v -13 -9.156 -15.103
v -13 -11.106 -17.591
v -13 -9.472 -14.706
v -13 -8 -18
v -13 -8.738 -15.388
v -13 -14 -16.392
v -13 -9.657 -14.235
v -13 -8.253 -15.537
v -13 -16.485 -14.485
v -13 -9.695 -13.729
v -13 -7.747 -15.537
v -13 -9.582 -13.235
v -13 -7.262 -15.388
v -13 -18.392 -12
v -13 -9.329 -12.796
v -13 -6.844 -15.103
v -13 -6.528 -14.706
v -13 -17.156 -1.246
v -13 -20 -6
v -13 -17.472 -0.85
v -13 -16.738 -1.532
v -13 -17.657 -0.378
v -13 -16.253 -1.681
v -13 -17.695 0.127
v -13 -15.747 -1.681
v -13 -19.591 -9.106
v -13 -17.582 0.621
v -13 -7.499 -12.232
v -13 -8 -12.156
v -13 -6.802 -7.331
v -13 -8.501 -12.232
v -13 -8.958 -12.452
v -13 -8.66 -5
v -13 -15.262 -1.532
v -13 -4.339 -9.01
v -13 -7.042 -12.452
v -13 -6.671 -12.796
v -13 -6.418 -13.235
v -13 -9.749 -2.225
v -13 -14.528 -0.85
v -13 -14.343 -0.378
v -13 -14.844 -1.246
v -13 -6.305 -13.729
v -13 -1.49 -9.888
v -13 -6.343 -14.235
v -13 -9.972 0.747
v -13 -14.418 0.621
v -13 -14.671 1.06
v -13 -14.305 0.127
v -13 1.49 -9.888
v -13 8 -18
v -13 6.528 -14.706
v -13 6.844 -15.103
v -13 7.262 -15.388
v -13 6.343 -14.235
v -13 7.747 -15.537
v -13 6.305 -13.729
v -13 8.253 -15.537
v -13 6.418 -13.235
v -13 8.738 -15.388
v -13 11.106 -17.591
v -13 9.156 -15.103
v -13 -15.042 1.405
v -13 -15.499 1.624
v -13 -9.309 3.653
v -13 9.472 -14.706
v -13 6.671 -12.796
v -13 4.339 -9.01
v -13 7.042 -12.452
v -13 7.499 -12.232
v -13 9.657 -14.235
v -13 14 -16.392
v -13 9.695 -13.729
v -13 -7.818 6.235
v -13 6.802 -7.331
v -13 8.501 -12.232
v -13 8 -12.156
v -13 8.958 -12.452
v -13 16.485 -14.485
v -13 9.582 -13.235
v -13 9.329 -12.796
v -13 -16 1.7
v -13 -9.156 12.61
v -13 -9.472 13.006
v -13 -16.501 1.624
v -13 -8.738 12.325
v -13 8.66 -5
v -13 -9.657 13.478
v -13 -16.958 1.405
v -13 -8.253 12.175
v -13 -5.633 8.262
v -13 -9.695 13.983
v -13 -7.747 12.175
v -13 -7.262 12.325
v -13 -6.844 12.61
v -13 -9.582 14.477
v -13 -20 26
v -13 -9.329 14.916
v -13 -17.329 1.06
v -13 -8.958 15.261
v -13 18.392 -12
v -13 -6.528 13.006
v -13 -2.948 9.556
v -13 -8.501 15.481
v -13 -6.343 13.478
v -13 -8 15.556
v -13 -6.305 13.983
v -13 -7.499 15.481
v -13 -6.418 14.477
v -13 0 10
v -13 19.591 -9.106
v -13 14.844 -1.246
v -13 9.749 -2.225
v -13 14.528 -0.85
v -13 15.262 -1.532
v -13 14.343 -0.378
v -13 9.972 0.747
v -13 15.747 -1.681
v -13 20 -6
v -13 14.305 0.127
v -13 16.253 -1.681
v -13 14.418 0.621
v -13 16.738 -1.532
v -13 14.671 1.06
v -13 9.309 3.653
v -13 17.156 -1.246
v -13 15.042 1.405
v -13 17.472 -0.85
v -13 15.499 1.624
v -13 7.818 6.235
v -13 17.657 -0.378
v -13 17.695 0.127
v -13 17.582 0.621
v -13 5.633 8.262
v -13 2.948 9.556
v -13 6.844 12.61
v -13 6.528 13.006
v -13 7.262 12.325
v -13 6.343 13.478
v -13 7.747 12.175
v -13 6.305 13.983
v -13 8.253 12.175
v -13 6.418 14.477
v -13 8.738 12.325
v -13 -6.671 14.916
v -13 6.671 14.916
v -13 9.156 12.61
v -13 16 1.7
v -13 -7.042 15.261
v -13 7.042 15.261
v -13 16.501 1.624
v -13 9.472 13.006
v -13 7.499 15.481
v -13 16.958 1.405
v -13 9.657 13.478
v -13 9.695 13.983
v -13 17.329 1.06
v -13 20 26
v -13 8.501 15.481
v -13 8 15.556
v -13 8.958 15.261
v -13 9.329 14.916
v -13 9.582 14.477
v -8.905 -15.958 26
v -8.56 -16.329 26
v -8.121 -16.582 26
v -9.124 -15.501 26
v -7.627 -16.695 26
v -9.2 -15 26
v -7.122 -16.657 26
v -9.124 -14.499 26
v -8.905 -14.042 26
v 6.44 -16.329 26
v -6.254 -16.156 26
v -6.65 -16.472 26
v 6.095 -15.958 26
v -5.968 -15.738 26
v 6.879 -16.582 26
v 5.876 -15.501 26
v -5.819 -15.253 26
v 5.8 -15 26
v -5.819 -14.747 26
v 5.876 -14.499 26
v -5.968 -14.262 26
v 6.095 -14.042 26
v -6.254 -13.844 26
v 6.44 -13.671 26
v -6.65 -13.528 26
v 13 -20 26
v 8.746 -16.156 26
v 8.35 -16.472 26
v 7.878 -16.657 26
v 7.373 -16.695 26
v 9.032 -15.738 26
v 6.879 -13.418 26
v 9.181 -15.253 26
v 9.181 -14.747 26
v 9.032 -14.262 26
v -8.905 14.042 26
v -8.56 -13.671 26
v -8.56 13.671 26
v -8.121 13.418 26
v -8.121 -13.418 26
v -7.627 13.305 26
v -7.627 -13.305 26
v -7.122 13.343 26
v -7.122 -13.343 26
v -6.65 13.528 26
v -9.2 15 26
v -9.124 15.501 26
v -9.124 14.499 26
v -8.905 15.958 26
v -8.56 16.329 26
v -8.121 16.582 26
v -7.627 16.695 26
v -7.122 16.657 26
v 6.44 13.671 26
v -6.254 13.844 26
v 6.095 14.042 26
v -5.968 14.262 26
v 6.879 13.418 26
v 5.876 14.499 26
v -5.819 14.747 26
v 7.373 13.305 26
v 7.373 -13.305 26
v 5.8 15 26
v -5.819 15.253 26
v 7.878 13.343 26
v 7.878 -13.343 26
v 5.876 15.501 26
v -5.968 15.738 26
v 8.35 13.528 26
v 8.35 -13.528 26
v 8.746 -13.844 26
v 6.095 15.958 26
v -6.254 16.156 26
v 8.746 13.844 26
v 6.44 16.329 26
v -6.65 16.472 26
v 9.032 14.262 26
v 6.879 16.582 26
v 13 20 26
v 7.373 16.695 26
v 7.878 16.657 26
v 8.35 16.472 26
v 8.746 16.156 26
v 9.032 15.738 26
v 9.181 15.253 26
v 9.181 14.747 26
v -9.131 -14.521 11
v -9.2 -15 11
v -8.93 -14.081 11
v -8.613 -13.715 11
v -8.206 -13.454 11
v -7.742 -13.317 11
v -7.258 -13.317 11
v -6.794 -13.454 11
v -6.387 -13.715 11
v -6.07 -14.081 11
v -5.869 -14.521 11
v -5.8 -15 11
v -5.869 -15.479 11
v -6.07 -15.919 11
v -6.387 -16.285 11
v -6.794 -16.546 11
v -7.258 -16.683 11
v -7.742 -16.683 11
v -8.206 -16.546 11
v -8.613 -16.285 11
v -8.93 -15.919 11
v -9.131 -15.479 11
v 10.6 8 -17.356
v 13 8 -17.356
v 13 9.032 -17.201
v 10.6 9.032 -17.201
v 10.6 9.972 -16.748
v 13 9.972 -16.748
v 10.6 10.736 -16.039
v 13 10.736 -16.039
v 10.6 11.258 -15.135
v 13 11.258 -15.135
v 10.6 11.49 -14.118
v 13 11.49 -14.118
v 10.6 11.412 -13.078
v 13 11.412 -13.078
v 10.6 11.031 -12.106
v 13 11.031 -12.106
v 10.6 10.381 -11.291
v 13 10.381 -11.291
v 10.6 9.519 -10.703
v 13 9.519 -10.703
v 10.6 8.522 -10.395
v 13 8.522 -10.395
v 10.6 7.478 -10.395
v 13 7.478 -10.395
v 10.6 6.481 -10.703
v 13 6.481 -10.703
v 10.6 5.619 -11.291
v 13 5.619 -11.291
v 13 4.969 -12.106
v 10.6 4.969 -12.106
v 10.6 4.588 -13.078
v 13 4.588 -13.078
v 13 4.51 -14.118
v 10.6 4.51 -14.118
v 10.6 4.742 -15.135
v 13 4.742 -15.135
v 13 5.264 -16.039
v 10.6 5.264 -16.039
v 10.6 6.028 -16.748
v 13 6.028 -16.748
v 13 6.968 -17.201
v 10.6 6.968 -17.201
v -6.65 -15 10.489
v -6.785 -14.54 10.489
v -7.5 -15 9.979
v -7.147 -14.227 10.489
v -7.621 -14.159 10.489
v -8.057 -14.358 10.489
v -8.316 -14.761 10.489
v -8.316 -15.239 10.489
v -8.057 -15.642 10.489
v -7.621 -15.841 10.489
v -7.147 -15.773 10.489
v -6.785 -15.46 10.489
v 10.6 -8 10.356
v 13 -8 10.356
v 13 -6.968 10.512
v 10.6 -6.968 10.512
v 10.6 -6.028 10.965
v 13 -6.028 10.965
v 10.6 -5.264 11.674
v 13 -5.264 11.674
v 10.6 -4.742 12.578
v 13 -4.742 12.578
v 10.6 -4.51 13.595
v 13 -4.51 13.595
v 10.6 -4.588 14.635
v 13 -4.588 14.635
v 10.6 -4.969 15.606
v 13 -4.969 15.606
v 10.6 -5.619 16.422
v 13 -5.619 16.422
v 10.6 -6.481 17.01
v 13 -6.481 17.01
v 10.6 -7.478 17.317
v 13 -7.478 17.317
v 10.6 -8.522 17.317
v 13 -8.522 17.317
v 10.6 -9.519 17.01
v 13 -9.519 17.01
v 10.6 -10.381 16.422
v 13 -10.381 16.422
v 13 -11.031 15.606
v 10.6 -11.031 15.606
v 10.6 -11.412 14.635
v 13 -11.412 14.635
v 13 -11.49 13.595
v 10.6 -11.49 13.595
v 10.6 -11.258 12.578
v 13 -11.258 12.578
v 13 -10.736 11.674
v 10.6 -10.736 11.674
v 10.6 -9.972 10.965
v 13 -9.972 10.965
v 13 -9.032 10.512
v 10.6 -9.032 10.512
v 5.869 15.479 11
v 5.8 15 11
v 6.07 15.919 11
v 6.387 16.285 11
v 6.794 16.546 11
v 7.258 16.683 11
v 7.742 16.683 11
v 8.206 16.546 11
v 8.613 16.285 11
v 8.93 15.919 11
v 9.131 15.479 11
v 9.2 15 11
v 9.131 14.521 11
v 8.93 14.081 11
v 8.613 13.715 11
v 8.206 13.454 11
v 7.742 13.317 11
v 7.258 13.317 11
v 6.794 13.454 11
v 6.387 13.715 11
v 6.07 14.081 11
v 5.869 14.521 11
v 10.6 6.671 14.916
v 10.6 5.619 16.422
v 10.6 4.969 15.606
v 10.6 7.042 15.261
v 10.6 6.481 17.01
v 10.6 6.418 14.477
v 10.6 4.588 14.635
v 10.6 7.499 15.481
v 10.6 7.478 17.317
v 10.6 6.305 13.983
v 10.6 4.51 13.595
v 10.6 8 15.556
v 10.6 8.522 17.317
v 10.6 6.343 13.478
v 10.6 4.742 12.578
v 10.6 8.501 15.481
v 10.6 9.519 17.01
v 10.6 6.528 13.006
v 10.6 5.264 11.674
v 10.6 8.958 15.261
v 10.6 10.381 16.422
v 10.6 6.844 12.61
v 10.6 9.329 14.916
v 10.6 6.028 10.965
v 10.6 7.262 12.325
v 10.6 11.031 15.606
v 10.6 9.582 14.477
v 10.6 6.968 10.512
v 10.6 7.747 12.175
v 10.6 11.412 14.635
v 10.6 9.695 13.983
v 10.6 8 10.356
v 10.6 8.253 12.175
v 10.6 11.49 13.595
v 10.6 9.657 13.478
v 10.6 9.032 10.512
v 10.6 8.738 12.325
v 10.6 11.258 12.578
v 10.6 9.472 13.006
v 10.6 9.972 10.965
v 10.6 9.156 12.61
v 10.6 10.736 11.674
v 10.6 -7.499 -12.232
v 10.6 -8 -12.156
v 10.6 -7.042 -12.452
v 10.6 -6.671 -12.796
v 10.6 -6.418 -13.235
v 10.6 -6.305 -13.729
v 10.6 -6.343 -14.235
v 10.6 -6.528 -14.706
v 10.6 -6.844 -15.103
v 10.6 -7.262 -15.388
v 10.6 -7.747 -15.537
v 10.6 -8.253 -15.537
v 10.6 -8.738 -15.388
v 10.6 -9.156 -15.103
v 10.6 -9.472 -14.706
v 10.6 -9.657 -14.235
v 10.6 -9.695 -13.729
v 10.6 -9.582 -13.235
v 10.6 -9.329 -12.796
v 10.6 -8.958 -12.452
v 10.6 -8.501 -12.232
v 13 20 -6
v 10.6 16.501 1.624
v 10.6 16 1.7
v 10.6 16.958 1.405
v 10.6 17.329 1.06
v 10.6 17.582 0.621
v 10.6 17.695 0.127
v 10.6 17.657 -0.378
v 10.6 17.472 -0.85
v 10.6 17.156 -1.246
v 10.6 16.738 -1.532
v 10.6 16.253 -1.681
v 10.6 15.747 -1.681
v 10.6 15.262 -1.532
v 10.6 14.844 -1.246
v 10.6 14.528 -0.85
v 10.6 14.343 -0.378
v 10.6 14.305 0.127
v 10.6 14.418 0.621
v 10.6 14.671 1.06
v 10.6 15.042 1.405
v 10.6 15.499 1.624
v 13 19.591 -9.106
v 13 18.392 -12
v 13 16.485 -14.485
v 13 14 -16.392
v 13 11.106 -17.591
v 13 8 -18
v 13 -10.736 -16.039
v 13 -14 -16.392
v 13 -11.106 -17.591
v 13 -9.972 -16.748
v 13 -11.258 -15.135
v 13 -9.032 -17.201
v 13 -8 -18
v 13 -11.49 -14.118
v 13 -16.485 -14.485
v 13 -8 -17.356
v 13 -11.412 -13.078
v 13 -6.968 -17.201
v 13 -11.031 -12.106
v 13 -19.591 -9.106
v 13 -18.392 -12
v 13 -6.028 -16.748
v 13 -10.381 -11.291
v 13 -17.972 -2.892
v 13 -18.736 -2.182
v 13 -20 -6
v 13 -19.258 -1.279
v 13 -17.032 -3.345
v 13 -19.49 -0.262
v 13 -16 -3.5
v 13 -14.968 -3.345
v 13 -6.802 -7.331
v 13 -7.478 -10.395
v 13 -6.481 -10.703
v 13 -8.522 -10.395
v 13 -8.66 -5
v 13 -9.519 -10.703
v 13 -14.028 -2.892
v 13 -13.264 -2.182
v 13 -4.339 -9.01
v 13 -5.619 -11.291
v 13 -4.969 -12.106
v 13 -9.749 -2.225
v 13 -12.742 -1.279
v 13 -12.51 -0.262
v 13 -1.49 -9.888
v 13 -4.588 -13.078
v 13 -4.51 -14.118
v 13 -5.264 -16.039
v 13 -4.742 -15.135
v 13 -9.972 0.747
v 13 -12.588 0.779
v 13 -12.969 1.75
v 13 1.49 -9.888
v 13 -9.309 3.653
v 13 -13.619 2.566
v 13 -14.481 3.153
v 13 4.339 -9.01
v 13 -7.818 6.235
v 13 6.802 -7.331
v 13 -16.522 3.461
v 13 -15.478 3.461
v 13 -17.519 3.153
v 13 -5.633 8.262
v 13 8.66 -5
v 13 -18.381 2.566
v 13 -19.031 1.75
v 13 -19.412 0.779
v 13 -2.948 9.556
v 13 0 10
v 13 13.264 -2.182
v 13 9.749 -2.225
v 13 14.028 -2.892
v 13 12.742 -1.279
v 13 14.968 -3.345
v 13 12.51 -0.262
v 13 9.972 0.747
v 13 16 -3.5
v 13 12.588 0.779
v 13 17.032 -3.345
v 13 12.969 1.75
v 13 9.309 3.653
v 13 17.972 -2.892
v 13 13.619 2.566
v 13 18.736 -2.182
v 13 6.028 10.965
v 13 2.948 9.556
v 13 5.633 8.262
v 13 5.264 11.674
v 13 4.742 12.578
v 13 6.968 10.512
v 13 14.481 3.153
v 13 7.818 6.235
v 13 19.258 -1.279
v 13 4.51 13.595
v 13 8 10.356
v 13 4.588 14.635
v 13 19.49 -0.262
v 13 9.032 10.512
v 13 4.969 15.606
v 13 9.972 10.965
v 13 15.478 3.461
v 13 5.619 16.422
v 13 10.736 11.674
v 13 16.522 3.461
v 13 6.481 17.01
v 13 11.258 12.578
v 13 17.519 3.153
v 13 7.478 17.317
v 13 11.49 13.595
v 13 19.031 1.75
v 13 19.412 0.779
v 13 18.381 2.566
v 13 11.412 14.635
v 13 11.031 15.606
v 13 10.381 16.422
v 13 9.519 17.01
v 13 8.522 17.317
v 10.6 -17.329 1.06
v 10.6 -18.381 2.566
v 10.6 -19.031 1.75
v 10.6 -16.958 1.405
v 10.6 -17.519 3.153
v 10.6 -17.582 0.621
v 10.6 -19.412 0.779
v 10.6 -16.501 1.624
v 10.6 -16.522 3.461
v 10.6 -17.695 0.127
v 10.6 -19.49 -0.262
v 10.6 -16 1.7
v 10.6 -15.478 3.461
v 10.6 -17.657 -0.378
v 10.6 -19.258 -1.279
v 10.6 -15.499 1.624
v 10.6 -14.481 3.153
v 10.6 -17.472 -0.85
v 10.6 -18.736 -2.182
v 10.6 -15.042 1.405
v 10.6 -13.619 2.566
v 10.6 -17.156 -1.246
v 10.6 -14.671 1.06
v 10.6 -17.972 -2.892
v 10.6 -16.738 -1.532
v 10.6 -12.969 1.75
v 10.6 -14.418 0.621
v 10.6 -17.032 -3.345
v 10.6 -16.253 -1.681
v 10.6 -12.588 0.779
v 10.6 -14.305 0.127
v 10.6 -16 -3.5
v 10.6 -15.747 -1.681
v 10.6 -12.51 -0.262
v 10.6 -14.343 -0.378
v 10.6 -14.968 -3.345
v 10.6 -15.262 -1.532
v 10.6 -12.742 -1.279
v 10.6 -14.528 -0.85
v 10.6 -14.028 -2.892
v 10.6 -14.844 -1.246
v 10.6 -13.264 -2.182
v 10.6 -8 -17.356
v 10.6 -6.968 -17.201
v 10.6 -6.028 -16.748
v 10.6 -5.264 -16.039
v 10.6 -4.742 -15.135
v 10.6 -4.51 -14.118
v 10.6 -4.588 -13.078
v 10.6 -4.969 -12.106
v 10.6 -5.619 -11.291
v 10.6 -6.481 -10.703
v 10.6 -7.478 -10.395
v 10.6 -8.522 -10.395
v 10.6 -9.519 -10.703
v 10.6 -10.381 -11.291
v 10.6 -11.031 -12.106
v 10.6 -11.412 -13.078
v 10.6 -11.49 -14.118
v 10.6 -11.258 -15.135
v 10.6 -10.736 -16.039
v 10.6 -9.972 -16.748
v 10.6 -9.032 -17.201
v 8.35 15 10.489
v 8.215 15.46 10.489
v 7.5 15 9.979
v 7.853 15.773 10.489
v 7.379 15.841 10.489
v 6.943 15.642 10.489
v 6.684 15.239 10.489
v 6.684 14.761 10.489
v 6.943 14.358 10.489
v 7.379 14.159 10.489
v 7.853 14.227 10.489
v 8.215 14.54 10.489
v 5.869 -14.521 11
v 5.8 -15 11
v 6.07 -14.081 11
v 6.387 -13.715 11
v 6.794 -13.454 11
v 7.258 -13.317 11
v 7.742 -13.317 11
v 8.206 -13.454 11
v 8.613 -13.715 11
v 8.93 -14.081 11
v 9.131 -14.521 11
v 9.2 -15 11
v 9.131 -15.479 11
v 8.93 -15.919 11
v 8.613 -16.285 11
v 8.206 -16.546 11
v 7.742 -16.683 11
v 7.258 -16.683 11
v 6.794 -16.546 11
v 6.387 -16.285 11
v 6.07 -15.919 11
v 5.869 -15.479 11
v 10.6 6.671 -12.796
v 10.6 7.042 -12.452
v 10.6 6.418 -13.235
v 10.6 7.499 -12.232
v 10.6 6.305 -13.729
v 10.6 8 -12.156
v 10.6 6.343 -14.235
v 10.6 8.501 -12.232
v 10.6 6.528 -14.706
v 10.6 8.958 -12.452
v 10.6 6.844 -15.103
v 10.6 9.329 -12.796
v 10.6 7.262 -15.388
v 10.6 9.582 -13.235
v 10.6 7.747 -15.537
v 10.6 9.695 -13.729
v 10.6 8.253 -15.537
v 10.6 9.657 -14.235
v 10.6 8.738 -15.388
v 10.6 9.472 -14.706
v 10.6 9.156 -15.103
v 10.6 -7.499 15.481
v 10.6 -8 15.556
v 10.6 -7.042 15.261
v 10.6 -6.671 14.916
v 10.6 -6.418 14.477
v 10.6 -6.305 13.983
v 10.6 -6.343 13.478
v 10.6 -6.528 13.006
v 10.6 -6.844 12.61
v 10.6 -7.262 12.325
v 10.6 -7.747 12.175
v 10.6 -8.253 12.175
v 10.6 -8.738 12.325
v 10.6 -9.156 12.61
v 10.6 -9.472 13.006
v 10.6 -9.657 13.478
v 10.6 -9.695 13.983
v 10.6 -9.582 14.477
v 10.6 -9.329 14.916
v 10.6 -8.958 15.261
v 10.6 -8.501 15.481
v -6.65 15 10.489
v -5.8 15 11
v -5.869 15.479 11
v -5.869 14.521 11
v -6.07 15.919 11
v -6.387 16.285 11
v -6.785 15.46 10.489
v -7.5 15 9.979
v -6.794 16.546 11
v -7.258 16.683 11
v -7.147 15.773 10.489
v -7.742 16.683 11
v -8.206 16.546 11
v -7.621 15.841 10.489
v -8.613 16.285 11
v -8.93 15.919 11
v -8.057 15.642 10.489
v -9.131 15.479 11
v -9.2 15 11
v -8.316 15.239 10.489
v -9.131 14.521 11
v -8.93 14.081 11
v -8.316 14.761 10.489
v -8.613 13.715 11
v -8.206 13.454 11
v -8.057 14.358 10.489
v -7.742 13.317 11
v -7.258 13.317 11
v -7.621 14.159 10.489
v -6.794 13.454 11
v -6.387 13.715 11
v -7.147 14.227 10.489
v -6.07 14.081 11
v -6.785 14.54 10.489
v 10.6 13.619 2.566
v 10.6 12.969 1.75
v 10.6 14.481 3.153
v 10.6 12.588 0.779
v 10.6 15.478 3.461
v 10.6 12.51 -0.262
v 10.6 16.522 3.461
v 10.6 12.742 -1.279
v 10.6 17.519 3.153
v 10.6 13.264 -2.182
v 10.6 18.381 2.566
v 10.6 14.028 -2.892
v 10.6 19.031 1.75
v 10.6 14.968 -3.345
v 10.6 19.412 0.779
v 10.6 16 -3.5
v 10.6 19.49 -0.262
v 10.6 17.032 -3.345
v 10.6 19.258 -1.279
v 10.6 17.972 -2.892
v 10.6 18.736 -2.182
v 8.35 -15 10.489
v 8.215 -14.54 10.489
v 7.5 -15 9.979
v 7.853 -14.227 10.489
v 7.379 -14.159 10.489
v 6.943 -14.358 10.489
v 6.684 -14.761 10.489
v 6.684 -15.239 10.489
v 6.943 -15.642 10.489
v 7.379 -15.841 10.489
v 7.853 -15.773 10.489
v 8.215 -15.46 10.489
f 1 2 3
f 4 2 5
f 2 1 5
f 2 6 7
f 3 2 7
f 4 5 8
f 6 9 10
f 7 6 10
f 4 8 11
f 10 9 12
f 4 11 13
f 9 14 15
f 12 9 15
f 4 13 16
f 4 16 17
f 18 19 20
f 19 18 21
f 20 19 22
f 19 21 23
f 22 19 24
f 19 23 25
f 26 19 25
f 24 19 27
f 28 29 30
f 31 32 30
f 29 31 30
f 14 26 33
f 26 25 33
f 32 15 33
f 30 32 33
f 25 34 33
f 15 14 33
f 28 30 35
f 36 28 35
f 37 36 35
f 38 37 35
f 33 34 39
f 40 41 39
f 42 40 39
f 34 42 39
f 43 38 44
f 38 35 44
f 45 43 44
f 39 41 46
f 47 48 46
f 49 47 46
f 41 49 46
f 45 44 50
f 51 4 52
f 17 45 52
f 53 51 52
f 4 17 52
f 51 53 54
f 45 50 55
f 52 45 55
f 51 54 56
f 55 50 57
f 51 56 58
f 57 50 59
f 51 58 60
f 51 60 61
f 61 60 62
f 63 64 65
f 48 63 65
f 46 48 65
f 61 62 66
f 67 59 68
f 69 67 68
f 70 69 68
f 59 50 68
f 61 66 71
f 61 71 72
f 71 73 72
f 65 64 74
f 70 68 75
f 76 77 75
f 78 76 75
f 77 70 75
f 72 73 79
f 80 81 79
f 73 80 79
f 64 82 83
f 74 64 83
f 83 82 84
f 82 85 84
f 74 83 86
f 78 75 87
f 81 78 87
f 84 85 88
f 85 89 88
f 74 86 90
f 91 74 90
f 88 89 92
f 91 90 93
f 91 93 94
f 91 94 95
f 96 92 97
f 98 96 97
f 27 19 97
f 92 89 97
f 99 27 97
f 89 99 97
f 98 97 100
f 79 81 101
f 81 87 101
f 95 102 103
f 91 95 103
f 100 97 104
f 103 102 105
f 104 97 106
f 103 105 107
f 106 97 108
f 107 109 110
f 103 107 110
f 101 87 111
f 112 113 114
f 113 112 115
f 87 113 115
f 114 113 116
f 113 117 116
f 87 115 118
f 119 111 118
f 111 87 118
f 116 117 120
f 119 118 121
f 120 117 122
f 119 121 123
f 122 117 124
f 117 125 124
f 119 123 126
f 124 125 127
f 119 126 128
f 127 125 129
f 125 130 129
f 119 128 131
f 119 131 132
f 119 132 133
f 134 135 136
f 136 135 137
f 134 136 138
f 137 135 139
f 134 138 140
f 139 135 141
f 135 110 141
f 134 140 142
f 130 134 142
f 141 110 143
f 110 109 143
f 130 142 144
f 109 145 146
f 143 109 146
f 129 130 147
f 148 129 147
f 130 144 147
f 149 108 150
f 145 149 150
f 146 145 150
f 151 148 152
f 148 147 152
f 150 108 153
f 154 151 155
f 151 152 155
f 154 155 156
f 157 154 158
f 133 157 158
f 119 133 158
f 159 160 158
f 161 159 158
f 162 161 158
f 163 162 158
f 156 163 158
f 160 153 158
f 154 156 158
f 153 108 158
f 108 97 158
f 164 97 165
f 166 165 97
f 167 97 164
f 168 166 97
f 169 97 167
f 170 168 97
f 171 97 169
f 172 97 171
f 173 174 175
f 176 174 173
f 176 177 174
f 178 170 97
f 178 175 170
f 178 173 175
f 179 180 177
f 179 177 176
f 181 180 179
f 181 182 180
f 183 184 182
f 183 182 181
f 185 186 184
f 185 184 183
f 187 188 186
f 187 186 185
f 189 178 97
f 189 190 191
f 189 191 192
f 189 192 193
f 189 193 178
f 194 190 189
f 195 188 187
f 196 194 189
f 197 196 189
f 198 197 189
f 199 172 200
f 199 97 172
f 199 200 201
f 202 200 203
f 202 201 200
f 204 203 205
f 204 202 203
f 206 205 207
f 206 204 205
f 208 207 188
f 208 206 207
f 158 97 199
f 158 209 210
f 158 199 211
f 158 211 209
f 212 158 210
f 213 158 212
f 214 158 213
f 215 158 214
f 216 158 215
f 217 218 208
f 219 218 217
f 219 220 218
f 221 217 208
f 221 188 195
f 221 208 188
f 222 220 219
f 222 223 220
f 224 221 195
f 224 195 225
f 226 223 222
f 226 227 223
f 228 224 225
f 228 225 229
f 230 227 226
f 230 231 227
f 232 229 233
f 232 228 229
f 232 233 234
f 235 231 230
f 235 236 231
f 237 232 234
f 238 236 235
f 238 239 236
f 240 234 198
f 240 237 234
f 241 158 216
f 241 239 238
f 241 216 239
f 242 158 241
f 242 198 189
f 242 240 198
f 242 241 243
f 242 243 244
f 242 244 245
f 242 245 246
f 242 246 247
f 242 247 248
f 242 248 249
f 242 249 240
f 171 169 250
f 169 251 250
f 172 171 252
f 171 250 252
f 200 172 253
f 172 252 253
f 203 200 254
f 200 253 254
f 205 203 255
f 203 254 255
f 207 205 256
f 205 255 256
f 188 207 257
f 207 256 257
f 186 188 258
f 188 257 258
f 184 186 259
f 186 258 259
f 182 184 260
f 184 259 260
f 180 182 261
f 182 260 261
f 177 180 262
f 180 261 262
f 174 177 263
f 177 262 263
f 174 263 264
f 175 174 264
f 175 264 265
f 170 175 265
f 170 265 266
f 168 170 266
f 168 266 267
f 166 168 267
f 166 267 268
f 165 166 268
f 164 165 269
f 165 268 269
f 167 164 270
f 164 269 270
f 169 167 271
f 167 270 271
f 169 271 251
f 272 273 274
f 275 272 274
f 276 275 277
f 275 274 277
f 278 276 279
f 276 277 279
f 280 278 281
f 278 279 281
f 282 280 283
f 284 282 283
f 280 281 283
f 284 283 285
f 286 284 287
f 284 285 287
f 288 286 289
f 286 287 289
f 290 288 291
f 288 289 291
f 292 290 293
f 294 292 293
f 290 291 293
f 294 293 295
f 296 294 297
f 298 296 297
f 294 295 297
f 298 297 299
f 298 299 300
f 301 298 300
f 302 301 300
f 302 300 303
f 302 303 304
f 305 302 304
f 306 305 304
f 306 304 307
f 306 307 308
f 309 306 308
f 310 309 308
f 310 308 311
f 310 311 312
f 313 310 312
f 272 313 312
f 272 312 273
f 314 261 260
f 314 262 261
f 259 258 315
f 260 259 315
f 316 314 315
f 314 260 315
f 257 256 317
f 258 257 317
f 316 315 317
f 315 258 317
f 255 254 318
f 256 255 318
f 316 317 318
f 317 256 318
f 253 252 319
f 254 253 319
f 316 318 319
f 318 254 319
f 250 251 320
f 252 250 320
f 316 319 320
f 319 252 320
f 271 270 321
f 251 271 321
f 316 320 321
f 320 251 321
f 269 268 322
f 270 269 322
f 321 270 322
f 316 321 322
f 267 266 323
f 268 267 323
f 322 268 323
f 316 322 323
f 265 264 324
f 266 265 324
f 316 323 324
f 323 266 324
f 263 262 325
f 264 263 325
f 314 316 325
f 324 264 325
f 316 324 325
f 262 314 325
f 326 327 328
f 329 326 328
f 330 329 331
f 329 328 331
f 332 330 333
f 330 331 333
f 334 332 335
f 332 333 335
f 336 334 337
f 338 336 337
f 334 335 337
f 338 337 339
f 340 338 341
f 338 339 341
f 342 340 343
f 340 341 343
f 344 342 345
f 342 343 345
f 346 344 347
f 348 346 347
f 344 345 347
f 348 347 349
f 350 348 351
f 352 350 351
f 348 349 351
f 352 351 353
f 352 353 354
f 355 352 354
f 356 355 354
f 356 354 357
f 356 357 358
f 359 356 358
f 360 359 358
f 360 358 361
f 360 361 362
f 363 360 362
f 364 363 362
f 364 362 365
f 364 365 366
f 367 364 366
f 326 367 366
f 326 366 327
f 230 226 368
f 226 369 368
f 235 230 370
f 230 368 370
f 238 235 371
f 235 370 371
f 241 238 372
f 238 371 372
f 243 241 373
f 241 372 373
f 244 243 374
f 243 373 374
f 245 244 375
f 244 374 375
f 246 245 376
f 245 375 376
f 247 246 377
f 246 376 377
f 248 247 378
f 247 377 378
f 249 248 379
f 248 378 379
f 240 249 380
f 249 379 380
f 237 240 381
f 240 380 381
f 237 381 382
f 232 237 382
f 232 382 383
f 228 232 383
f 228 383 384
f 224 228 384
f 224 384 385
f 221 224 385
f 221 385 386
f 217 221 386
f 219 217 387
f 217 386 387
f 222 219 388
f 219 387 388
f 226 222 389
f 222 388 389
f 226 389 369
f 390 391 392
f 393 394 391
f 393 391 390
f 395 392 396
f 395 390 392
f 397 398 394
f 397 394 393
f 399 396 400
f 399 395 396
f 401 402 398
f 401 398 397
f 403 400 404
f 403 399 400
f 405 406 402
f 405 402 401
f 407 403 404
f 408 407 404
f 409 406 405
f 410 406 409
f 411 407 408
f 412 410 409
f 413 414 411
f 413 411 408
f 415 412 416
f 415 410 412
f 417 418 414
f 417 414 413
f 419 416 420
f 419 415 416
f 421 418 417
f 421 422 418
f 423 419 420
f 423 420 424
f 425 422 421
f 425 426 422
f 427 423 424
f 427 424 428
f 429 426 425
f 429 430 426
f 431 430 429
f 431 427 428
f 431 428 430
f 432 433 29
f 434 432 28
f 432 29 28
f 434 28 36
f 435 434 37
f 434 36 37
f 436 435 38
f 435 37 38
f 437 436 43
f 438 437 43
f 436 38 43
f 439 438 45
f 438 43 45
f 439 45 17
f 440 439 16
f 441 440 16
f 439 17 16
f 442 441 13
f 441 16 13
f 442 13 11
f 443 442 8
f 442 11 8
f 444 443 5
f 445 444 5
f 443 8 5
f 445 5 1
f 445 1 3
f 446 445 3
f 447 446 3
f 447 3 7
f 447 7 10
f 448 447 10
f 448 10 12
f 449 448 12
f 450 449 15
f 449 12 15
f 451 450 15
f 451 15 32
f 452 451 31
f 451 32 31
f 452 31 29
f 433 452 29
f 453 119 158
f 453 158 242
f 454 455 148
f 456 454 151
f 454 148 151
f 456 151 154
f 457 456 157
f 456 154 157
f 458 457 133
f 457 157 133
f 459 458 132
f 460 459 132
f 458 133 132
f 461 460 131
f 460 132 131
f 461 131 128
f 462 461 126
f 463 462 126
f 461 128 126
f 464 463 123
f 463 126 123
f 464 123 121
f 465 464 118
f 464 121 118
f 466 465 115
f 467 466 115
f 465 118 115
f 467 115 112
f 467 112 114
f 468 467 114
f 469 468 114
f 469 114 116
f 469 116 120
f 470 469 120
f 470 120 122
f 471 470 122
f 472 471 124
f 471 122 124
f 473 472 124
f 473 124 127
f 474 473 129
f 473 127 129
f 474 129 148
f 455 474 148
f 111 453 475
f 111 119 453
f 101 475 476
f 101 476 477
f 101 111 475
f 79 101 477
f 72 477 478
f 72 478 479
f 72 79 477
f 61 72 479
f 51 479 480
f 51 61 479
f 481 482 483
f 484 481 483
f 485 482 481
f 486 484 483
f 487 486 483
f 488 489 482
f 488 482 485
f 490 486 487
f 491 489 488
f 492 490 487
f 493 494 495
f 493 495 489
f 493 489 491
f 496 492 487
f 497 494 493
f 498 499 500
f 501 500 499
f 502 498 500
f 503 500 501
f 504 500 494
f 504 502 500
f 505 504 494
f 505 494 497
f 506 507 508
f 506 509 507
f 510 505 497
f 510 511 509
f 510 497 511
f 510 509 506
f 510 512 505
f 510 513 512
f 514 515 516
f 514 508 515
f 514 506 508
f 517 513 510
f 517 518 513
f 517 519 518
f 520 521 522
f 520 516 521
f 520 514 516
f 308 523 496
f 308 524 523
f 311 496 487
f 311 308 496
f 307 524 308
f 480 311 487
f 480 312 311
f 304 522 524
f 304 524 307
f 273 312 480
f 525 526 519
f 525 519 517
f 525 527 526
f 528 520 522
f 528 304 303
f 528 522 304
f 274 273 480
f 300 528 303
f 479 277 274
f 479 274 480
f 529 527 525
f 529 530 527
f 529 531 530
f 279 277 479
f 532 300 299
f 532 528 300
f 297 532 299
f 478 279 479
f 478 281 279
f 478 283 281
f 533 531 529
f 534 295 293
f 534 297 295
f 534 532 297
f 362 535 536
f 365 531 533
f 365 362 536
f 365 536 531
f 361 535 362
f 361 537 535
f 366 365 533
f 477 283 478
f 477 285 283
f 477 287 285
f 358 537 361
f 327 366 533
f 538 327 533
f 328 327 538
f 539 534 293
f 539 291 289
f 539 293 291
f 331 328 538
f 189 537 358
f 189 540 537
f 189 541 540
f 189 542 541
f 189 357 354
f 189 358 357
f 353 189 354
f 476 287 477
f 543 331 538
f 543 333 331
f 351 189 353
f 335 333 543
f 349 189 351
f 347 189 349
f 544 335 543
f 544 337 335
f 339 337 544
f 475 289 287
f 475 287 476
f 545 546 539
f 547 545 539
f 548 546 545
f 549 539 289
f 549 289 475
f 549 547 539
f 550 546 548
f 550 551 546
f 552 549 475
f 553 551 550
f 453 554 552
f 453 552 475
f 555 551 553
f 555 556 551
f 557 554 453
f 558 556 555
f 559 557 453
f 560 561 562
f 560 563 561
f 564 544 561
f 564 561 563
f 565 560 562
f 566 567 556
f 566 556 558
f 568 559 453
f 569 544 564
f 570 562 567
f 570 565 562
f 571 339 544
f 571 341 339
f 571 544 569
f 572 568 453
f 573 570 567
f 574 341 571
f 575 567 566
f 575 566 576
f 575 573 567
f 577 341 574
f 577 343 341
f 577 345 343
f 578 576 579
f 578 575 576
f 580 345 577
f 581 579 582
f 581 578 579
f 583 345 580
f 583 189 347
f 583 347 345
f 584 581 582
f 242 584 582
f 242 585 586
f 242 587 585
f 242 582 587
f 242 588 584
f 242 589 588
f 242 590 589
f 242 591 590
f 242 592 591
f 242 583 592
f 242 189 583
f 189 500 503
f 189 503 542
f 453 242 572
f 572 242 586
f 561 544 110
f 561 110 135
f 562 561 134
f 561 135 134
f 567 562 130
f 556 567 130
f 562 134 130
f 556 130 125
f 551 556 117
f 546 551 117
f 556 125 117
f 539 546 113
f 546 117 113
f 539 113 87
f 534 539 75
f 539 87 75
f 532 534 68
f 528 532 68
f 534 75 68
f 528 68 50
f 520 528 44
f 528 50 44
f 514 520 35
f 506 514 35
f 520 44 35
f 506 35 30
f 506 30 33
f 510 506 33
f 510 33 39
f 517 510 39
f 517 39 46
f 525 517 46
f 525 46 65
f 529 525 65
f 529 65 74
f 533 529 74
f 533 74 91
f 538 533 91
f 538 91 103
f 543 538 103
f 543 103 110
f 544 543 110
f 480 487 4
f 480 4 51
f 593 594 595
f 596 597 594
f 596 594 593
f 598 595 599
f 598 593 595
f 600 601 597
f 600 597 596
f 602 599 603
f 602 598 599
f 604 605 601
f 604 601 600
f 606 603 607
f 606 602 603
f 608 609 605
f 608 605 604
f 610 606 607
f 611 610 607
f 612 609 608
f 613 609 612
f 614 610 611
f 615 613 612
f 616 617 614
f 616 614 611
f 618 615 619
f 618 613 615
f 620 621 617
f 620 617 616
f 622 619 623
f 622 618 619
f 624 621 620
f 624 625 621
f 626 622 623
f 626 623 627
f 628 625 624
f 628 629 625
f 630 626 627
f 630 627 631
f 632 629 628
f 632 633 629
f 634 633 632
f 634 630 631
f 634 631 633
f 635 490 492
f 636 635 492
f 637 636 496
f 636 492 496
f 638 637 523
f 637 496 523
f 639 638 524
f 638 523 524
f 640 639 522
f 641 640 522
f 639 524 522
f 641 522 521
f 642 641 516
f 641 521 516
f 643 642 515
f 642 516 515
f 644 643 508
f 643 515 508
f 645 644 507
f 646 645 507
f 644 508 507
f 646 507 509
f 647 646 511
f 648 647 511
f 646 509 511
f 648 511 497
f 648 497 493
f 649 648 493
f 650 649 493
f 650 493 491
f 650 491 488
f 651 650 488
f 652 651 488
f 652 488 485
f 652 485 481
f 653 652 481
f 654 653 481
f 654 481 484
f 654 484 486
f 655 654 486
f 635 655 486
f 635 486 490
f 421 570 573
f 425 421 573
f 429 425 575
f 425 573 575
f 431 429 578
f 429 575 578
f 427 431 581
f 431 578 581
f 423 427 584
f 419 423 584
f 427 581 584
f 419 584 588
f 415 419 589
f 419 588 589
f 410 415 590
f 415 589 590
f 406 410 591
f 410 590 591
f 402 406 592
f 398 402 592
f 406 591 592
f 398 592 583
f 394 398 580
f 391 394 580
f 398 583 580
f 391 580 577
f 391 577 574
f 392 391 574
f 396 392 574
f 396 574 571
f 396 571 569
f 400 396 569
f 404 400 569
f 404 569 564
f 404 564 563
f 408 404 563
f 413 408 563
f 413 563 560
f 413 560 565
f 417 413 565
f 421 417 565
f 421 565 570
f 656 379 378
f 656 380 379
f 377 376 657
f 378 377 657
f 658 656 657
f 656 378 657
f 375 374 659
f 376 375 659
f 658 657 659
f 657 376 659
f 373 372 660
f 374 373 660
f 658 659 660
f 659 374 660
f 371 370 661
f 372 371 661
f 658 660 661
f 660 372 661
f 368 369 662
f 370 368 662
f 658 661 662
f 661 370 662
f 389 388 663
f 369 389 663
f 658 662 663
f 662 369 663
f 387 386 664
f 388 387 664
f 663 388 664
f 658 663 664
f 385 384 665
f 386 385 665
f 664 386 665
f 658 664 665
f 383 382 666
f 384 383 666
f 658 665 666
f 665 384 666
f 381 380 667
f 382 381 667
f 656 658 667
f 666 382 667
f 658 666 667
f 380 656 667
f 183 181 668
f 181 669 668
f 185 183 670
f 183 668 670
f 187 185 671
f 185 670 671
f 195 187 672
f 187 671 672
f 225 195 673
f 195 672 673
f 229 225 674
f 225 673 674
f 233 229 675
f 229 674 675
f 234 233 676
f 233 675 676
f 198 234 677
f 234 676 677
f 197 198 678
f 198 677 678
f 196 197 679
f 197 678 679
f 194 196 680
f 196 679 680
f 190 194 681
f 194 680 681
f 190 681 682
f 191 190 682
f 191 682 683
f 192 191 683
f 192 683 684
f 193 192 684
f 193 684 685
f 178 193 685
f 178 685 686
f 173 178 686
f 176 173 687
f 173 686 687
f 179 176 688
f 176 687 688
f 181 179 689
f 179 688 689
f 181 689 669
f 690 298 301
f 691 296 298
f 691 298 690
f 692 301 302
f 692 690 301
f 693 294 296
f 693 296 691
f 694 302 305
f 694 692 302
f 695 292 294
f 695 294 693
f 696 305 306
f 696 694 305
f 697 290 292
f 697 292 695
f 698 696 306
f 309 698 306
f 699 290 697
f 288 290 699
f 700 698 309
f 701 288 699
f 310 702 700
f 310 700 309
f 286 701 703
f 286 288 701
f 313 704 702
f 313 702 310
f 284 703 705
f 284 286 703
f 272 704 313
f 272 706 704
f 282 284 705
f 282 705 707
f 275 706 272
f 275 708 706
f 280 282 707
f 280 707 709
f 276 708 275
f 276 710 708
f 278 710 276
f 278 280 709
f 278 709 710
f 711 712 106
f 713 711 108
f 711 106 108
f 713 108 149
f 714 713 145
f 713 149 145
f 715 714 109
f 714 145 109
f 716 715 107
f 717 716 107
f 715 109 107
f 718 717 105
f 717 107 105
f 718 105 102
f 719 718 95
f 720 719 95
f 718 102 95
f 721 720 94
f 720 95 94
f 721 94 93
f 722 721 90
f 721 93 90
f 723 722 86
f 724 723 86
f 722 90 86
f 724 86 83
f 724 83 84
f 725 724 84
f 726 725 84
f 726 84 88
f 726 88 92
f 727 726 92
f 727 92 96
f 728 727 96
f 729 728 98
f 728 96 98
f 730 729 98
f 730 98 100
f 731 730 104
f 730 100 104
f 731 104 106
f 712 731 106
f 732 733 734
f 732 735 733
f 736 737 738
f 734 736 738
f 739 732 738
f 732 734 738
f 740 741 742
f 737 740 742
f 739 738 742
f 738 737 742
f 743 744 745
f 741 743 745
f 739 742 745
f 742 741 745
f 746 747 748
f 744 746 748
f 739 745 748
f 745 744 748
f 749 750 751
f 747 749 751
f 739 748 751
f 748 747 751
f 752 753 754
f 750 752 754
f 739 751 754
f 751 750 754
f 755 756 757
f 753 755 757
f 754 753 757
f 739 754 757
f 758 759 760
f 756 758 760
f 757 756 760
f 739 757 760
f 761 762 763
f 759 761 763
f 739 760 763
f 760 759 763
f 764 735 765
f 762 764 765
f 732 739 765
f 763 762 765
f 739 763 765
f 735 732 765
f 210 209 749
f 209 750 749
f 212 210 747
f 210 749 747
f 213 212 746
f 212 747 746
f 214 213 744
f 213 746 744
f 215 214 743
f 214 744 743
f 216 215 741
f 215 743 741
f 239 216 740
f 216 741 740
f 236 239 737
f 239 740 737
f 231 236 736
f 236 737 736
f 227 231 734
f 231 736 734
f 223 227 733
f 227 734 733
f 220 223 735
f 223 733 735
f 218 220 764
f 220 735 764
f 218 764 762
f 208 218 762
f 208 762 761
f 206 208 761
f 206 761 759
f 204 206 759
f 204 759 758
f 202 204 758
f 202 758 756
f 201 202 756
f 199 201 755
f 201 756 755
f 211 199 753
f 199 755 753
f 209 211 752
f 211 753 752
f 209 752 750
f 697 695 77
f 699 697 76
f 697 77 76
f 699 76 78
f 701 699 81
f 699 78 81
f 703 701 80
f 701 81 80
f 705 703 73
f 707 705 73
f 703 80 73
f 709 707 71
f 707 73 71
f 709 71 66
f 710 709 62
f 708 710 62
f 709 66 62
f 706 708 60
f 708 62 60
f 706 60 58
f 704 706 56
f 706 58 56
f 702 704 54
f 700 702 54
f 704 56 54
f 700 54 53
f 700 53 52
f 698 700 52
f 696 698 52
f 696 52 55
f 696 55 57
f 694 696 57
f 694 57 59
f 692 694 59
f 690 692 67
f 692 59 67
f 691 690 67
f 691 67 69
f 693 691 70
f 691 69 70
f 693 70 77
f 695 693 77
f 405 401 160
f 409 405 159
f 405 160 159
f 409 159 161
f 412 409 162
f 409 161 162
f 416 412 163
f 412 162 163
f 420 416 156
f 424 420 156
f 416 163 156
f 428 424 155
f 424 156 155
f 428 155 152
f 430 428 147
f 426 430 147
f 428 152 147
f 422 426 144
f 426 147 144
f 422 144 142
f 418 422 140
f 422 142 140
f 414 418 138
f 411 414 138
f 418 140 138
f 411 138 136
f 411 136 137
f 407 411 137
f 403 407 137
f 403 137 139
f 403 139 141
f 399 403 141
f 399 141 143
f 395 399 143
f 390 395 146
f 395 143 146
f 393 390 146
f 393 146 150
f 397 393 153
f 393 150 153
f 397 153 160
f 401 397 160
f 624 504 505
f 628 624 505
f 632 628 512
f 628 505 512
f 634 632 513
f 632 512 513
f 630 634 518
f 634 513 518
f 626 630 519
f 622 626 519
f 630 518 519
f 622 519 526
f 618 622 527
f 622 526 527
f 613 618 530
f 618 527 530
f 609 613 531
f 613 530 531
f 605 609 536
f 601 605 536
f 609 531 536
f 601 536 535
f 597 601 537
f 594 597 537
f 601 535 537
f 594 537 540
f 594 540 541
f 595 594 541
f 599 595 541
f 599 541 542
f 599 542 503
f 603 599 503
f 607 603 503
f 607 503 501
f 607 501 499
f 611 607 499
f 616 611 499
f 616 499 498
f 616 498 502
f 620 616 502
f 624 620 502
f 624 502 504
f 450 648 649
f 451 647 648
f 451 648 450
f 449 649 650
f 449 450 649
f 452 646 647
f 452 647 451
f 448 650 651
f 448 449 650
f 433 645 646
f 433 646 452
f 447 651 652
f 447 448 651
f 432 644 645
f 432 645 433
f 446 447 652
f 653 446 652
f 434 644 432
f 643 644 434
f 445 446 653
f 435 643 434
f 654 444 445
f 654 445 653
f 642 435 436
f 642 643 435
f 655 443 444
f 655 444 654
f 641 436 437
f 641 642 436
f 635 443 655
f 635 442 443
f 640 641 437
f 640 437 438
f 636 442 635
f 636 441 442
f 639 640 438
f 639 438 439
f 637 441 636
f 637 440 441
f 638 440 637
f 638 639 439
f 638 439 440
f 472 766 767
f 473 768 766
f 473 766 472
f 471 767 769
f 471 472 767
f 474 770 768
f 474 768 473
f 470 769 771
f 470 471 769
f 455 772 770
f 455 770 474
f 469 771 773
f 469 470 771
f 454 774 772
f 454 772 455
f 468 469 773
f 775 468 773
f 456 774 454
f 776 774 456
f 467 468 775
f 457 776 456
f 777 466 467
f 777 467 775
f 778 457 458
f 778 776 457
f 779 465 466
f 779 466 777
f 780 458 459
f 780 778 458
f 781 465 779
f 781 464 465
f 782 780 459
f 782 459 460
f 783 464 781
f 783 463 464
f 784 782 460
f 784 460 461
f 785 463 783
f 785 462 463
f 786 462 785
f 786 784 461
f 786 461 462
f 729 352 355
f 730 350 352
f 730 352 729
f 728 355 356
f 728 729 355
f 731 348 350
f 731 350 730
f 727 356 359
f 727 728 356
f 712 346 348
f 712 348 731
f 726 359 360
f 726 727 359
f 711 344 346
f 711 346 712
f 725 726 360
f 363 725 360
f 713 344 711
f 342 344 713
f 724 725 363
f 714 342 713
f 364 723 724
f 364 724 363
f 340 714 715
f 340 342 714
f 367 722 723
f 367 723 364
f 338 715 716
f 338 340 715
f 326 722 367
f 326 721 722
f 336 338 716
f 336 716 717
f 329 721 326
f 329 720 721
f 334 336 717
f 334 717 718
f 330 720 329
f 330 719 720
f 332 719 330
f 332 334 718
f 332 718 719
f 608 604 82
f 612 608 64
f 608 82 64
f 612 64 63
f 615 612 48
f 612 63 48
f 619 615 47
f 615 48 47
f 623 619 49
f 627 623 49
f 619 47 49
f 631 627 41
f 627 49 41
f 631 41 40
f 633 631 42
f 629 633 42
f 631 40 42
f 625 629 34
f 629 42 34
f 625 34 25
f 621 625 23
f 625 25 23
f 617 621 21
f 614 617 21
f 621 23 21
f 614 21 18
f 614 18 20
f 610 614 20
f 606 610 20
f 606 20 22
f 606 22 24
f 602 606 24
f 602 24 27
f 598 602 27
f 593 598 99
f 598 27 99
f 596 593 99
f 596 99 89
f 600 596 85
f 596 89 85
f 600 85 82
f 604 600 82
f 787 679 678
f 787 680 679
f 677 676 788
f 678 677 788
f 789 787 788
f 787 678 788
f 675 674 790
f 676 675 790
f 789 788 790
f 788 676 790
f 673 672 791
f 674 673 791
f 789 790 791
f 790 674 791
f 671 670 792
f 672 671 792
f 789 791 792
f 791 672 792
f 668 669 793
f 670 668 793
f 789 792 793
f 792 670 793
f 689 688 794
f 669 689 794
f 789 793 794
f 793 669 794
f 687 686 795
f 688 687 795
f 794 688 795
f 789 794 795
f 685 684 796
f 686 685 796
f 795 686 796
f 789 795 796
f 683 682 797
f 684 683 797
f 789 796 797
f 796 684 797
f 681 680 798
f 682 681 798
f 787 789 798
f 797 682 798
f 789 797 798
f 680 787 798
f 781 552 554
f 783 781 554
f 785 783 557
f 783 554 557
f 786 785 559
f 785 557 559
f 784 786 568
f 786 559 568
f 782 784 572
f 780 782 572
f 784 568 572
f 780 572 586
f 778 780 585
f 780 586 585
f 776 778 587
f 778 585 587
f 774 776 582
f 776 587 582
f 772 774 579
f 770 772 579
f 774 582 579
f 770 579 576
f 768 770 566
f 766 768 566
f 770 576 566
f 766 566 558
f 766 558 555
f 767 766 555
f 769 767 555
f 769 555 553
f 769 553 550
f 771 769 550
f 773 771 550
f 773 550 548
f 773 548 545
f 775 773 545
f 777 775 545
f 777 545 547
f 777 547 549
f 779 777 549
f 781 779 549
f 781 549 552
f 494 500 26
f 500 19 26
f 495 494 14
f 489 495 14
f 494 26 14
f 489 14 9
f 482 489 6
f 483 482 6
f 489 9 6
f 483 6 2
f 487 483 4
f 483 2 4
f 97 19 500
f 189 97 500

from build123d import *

# Parameters (mm, degrees)
CROQUIS1_W                                           = 26
CROQUIS1_H                                           = 40
SALIENTE_EXTRUIR1_DEPTH                              = 26
TALADRO_DE_MARGEN_PARA_M31_D                         = 3.4
TALADRO_DE_MARGEN_PARA_M31_DEPTH                     = 15
TALADRO_DE_MARGEN_PARA_M31_TIP                       = 1.021463052
REFRENTADO_PARA_TORNILLO_CON_CABEZA_TRON_D           = 3.4
REFRENTADO_PARA_TORNILLO_CON_CABEZA_TRON_CBORE_D     = 7
REFRENTADO_PARA_TORNILLO_CON_CABEZA_TRON_CBORE_DEPTH = 2.4
CROQUIS7_R                                           = 10
CORTAR_EXTRUIR1_DEPTH                                = 42.856899073
CROQUIS9_W                                           = 8
CROQUIS9_H                                           = 40
CORTAR_EXTRUIR3_DEPTH                                = 42.856899073
REDONDEO3_R                                          = 12


with BuildPart() as part:
    # Croquis1 → Saliente-Extruir1 (new, symmetric)
    with BuildSketch(Plane.XY):
        Rectangle(CROQUIS1_W, CROQUIS1_H)
    extrude(amount=SALIENTE_EXTRUIR1_DEPTH, both=True)

    # Taladro de margen para M31
    with Locations(Plane.XY.offset(26)):
        with Locations((-7.5, 15), (7.5, -15), (7.5, 15), (-7.5, -15)):
            Hole(TALADRO_DE_MARGEN_PARA_M31_D / 2, depth=TALADRO_DE_MARGEN_PARA_M31_DEPTH)
            with Locations((0, 0, -(TALADRO_DE_MARGEN_PARA_M31_DEPTH + TALADRO_DE_MARGEN_PARA_M31_TIP / 2))):  # 118° drill point
                Cone(0, TALADRO_DE_MARGEN_PARA_M31_D / 2, TALADRO_DE_MARGEN_PARA_M31_TIP, mode=Mode.SUBTRACT)

    # Refrentado para tornillo con cabeza troncocónica de M31 (through all)
    with Locations(Plane(origin=(13, 0, 0), x_dir=(0, 0, -1), z_dir=(1, 0, 0))):
        with Locations((0, 16), (13.856406461, 8), (13.856406461, -8), (0, -16), (-13.856406461, -8), (-13.856406461, 8)):
            CounterBoreHole(REFRENTADO_PARA_TORNILLO_CON_CABEZA_TRON_D / 2, REFRENTADO_PARA_TORNILLO_CON_CABEZA_TRON_CBORE_D / 2, REFRENTADO_PARA_TORNILLO_CON_CABEZA_TRON_CBORE_DEPTH)

    # Croquis7 → Cortar-Extruir1 (cut, through all)
    with BuildSketch(Plane.ZY.offset(13)):
        Circle(CROQUIS7_R)
    extrude(amount=-CORTAR_EXTRUIR1_DEPTH, mode=Mode.SUBTRACT)

    # Croquis9 → Cortar-Extruir3 (cut, through all)
    with BuildSketch(Plane(origin=(13, 0, 0), x_dir=(0, 0, -1), z_dir=(1, 0, 0))):
        with Locations((22, 0)):
            Rectangle(CROQUIS9_W, CROQUIS9_H)
    extrude(amount=-CORTAR_EXTRUIR3_DEPTH, mode=Mode.SUBTRACT)

    # Redondeo3
    redondeo3_edges = [part.edges().sort_by_distance(p)[0] for p in [
        (0, -20, -18),
        (0, 20, -18),
    ]]
    fillet(redondeo3_edges, radius=REDONDEO3_R)


solid = part.part
